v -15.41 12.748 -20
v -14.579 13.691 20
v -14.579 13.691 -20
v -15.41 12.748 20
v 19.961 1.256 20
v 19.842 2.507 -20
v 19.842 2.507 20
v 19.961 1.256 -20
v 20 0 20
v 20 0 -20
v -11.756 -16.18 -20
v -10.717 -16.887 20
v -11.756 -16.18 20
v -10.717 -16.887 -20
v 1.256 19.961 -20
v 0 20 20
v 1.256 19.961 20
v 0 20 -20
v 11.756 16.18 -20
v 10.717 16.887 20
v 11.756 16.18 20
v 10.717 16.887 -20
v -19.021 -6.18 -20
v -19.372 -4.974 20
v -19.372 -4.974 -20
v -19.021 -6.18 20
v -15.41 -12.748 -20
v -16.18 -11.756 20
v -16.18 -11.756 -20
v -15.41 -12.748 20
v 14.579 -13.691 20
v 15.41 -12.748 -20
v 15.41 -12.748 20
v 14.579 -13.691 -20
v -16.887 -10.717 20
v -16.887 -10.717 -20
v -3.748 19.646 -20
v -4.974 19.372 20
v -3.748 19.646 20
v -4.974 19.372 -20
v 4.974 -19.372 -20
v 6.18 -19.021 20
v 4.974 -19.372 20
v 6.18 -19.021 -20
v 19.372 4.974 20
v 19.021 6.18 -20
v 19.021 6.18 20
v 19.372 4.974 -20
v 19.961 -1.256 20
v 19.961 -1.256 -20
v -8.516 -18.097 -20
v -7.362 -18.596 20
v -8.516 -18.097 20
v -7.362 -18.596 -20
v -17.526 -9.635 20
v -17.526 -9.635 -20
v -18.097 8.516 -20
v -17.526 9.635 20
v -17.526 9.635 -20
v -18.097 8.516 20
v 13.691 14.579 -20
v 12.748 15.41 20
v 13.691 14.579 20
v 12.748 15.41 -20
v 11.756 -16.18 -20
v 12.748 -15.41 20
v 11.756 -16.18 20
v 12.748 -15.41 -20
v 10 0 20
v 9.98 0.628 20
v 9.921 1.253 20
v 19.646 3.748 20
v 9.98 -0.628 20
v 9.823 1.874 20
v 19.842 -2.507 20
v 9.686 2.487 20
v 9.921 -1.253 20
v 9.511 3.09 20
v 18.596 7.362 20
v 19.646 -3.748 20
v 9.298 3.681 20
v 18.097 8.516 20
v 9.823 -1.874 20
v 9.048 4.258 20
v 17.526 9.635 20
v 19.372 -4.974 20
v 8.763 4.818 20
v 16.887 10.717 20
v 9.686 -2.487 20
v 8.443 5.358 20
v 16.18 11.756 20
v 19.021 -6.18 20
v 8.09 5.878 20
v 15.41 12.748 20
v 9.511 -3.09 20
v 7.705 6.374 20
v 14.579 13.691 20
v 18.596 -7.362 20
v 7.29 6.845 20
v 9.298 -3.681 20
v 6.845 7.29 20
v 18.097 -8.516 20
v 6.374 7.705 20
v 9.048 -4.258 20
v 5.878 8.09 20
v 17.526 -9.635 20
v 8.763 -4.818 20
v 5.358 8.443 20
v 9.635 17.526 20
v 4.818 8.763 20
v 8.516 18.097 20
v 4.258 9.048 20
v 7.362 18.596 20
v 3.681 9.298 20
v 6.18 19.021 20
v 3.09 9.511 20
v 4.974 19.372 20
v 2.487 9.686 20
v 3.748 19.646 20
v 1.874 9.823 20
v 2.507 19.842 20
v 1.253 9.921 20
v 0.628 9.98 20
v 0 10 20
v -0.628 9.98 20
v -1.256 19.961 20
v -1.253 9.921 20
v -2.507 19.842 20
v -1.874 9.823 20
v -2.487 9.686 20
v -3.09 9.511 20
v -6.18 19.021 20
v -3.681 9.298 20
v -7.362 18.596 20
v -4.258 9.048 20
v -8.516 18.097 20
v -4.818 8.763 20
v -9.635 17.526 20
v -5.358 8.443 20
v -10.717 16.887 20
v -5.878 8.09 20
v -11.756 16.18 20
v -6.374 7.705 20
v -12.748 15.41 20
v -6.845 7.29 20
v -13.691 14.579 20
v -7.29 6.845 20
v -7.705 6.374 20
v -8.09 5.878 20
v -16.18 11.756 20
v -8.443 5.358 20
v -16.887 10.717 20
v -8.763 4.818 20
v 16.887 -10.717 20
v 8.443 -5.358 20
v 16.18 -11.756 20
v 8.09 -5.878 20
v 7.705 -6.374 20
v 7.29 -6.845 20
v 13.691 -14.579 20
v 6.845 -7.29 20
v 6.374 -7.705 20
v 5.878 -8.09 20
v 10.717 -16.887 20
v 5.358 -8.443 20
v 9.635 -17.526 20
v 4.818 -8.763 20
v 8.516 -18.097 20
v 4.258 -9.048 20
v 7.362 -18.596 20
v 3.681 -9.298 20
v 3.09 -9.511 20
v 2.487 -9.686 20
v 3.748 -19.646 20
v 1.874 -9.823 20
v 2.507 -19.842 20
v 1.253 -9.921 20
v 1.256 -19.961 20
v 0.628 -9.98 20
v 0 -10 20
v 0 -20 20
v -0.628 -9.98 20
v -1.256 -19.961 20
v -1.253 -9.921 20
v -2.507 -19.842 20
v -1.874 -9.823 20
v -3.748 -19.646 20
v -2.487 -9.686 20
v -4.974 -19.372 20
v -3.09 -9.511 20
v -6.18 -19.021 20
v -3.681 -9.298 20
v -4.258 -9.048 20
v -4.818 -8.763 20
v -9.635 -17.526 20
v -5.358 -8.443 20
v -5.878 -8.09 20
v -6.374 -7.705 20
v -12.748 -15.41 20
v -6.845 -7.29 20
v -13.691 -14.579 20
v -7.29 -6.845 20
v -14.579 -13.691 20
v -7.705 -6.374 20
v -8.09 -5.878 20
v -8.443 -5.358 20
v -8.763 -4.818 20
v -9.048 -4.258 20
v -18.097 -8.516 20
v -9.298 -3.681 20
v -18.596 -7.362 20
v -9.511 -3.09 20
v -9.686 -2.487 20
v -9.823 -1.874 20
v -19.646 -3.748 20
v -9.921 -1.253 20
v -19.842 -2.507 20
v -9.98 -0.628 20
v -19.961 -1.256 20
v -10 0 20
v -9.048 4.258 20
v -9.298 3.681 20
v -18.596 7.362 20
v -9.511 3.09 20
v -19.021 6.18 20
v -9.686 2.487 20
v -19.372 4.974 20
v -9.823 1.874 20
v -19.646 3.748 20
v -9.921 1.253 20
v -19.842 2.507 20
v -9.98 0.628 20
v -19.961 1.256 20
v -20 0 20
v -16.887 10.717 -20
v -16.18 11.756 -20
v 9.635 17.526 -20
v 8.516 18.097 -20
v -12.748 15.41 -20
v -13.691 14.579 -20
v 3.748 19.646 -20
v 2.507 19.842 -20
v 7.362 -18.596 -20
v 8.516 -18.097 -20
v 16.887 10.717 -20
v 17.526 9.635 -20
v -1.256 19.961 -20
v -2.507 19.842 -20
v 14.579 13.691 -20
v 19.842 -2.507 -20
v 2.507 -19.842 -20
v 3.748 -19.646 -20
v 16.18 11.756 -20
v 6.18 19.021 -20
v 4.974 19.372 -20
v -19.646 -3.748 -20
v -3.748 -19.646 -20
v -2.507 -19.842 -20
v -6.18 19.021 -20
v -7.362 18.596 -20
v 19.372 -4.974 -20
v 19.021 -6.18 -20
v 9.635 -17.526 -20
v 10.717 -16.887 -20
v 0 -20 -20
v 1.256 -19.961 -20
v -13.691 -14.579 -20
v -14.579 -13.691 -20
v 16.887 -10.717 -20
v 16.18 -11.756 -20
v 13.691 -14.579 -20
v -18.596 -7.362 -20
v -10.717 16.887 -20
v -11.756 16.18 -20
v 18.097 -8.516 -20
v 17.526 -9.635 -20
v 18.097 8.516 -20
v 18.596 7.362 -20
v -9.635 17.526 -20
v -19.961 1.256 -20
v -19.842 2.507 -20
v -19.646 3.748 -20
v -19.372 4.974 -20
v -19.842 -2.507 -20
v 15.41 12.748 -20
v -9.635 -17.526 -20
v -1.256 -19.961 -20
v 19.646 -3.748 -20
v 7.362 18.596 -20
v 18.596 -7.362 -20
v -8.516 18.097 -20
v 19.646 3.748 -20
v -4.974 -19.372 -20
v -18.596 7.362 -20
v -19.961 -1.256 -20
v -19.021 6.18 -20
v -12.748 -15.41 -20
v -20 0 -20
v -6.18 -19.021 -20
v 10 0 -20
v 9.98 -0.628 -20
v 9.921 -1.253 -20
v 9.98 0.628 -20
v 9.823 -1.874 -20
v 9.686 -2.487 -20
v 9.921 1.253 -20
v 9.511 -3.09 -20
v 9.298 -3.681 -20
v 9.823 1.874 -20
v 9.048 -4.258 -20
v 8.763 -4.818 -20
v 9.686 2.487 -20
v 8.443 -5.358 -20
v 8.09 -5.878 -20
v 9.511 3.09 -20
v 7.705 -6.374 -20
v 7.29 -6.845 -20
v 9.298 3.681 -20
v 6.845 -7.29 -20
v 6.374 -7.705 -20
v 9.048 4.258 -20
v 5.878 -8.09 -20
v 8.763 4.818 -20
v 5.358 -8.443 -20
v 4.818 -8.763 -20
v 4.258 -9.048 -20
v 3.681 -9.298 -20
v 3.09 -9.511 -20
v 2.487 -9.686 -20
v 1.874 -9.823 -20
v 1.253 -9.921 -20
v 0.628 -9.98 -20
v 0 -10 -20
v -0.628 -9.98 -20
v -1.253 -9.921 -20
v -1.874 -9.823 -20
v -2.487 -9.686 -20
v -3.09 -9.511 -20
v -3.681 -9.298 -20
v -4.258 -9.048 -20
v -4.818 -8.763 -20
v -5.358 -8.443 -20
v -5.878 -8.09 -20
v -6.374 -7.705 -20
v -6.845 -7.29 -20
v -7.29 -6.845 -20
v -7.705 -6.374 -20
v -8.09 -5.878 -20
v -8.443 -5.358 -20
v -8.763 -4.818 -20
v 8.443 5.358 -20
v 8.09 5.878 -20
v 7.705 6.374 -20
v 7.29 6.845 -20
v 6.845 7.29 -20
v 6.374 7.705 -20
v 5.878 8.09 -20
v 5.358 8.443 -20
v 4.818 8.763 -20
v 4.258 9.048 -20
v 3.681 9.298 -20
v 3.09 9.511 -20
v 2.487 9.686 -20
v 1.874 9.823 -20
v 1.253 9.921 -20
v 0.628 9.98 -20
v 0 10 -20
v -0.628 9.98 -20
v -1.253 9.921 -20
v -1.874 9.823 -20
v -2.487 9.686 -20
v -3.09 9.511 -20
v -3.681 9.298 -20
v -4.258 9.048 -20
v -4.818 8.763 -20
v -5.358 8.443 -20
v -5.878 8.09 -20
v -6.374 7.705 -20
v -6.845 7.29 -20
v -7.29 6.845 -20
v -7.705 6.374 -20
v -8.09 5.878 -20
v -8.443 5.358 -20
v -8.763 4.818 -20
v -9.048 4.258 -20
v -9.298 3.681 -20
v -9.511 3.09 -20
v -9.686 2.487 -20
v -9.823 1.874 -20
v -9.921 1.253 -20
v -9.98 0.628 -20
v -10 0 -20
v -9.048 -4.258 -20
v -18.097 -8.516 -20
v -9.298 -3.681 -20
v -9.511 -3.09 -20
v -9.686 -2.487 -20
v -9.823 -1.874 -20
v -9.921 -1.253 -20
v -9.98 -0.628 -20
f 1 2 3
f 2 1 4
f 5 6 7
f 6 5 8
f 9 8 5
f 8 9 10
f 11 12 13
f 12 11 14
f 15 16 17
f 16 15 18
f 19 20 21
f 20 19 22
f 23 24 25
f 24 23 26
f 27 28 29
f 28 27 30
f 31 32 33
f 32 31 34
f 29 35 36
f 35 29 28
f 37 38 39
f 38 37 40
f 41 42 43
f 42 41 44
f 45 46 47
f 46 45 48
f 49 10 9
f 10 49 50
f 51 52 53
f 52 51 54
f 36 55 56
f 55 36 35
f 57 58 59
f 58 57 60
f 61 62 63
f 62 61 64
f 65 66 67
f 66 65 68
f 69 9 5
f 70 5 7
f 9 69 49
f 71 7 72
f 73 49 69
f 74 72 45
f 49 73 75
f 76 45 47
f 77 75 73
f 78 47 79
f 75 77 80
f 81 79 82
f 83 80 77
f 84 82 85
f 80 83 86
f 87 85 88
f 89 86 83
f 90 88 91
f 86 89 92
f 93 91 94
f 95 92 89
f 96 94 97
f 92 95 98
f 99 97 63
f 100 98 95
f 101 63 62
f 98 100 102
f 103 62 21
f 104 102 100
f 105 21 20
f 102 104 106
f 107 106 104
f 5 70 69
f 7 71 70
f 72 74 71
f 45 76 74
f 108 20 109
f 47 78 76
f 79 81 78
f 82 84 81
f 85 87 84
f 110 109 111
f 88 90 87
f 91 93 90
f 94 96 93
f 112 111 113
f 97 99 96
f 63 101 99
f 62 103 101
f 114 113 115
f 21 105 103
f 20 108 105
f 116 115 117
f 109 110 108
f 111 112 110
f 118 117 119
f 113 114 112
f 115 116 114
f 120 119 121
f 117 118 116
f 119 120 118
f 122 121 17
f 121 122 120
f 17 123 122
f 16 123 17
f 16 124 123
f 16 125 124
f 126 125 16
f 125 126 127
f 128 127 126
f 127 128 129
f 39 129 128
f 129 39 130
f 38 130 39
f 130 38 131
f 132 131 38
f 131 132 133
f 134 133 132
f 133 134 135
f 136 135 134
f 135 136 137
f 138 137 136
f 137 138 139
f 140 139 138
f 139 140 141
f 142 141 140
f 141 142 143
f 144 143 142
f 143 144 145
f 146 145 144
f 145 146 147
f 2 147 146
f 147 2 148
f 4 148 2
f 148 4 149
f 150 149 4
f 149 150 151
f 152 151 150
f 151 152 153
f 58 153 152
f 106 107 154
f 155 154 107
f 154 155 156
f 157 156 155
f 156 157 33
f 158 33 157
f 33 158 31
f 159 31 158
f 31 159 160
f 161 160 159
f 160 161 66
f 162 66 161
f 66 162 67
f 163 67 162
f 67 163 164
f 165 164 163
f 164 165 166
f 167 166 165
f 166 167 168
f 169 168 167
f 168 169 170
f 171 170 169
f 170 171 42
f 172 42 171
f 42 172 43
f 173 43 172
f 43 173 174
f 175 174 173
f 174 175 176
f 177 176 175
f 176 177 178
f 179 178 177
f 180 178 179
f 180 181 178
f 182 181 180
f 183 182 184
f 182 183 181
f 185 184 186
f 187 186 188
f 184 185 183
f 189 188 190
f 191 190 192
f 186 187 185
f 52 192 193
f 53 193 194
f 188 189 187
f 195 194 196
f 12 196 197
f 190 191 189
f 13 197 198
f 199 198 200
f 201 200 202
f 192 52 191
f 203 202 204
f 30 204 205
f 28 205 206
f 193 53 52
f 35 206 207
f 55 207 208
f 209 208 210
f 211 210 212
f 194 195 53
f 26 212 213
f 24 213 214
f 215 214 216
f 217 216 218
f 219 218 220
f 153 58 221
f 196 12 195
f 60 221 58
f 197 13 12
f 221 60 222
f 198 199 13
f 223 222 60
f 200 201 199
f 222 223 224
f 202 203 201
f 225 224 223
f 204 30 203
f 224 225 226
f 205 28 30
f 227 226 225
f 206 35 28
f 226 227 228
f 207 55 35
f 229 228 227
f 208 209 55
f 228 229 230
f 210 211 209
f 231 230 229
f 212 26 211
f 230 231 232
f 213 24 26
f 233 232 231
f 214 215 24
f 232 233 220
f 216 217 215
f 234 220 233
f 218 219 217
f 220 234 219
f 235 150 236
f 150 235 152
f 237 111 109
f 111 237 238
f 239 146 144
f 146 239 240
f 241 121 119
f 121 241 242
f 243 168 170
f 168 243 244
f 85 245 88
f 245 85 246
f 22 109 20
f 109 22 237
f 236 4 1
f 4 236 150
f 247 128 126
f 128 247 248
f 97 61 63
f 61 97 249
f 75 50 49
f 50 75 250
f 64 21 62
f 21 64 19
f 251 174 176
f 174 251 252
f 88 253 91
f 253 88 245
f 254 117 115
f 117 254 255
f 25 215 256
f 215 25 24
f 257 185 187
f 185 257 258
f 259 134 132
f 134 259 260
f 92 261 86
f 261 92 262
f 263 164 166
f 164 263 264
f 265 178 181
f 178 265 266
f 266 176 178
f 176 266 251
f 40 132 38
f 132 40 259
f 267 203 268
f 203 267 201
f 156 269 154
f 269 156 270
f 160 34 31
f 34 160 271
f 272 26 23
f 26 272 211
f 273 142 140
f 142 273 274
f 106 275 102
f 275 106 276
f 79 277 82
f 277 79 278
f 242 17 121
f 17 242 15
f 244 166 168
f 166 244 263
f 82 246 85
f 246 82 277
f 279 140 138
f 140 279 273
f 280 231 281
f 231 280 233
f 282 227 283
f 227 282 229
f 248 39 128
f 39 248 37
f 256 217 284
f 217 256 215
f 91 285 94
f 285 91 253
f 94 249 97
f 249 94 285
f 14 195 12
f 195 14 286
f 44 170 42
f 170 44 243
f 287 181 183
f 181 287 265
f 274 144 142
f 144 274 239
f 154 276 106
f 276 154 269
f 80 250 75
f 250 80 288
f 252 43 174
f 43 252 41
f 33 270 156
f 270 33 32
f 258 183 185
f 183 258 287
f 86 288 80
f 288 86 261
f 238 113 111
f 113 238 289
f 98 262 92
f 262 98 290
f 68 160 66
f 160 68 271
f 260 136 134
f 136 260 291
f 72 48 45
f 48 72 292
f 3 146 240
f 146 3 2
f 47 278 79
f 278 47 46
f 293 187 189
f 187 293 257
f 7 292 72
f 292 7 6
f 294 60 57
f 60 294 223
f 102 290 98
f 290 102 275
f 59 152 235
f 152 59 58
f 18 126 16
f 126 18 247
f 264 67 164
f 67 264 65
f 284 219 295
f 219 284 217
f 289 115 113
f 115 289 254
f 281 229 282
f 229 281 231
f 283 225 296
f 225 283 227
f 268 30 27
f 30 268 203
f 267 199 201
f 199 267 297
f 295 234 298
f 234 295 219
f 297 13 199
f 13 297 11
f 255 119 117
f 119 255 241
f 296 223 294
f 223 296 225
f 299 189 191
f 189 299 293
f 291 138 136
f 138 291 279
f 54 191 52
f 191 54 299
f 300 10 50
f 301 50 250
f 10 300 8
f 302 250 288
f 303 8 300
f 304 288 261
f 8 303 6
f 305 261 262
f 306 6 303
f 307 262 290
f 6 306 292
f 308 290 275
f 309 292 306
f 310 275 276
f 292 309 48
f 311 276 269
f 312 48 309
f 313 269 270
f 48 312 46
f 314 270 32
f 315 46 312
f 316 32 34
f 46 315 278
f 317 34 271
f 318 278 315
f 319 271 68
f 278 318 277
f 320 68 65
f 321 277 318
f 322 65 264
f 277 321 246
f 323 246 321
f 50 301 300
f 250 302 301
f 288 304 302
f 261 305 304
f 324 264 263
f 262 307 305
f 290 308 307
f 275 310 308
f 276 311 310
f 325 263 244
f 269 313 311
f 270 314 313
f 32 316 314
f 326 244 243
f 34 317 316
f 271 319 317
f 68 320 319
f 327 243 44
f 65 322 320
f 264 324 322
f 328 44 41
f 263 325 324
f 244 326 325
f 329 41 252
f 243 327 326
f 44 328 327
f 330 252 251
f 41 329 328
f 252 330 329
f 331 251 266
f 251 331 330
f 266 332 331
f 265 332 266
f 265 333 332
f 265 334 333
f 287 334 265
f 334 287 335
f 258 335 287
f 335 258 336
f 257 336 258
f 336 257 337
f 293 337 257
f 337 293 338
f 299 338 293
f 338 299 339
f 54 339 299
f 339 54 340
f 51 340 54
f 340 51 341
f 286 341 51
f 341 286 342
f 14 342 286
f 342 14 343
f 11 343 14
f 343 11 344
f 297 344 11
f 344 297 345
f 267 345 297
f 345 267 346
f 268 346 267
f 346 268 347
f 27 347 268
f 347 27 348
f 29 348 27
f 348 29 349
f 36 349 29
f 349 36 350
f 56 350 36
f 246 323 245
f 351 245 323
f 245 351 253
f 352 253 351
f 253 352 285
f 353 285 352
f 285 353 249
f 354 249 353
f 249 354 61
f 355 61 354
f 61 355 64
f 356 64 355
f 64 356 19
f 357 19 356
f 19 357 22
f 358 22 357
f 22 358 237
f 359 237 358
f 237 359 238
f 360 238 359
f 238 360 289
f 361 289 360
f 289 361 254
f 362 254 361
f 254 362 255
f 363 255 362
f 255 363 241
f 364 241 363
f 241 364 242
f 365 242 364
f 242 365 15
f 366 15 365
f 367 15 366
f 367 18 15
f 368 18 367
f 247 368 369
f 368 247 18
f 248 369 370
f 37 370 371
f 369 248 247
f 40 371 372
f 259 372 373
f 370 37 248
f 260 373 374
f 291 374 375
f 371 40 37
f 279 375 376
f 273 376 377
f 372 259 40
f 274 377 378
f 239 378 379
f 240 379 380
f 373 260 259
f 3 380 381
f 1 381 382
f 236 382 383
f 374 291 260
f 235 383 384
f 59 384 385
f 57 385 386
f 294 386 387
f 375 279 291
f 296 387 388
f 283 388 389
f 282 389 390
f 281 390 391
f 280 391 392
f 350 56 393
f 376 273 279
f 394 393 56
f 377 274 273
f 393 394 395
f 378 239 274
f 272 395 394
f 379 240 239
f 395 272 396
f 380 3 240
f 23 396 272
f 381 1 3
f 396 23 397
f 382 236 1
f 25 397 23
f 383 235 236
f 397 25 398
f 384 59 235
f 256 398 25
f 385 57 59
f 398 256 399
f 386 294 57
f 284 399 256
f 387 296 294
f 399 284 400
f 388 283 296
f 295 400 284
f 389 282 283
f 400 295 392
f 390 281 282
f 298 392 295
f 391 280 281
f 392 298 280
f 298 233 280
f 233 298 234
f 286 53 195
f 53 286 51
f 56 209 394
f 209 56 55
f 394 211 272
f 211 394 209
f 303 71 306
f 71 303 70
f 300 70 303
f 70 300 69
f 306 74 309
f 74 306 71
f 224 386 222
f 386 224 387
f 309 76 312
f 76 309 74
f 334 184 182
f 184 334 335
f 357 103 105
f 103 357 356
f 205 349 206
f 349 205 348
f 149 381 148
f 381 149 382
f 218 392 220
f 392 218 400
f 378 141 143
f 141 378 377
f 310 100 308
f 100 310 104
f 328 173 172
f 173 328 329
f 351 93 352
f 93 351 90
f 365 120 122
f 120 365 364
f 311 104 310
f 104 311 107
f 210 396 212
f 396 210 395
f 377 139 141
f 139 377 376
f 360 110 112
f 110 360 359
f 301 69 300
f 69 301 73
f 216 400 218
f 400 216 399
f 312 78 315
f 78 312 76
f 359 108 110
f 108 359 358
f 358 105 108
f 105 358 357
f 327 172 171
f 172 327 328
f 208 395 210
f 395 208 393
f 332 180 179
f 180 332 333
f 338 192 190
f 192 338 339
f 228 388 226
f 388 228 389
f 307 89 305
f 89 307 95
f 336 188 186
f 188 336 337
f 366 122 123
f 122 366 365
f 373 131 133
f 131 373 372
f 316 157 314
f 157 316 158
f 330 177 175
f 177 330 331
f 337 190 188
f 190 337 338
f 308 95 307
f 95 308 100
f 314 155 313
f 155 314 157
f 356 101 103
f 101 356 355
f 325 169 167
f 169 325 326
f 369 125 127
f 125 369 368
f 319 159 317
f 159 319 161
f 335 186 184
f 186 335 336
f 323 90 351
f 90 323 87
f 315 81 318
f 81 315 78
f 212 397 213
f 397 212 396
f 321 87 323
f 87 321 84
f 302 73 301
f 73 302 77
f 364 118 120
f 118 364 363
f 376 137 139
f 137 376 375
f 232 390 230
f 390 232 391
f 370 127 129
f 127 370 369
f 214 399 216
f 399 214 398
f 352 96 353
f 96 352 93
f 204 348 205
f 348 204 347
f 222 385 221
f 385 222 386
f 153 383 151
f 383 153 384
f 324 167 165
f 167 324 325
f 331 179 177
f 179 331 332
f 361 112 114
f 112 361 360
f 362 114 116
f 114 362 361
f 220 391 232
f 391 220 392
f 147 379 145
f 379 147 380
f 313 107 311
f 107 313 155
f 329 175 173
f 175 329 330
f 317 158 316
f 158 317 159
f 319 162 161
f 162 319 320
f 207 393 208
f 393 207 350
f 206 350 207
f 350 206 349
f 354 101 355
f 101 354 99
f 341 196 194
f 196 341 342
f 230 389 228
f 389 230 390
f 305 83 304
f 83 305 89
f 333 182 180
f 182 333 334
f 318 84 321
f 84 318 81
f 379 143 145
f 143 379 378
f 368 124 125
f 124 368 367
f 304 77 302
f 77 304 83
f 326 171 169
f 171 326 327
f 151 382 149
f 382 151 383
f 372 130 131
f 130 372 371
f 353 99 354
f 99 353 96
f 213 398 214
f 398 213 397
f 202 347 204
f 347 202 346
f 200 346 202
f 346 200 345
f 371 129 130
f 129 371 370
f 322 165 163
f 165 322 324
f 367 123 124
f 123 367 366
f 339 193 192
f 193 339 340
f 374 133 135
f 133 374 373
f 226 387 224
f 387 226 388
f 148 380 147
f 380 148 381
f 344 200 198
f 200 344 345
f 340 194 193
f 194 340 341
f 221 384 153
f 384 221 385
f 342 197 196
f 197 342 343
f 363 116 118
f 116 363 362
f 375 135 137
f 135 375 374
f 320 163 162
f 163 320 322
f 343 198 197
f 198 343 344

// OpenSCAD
// Anneau
$fn=100;
Rayon = 20;
RayonInt = 10;
Hauteur = 40;

difference() {
    {
        color("gray") 
        cylinder(h=Hauteur,r=Rayon, center = true );
    }
    cylinder(h=Hauteur+2,r=RayonInt, center = true);
}
